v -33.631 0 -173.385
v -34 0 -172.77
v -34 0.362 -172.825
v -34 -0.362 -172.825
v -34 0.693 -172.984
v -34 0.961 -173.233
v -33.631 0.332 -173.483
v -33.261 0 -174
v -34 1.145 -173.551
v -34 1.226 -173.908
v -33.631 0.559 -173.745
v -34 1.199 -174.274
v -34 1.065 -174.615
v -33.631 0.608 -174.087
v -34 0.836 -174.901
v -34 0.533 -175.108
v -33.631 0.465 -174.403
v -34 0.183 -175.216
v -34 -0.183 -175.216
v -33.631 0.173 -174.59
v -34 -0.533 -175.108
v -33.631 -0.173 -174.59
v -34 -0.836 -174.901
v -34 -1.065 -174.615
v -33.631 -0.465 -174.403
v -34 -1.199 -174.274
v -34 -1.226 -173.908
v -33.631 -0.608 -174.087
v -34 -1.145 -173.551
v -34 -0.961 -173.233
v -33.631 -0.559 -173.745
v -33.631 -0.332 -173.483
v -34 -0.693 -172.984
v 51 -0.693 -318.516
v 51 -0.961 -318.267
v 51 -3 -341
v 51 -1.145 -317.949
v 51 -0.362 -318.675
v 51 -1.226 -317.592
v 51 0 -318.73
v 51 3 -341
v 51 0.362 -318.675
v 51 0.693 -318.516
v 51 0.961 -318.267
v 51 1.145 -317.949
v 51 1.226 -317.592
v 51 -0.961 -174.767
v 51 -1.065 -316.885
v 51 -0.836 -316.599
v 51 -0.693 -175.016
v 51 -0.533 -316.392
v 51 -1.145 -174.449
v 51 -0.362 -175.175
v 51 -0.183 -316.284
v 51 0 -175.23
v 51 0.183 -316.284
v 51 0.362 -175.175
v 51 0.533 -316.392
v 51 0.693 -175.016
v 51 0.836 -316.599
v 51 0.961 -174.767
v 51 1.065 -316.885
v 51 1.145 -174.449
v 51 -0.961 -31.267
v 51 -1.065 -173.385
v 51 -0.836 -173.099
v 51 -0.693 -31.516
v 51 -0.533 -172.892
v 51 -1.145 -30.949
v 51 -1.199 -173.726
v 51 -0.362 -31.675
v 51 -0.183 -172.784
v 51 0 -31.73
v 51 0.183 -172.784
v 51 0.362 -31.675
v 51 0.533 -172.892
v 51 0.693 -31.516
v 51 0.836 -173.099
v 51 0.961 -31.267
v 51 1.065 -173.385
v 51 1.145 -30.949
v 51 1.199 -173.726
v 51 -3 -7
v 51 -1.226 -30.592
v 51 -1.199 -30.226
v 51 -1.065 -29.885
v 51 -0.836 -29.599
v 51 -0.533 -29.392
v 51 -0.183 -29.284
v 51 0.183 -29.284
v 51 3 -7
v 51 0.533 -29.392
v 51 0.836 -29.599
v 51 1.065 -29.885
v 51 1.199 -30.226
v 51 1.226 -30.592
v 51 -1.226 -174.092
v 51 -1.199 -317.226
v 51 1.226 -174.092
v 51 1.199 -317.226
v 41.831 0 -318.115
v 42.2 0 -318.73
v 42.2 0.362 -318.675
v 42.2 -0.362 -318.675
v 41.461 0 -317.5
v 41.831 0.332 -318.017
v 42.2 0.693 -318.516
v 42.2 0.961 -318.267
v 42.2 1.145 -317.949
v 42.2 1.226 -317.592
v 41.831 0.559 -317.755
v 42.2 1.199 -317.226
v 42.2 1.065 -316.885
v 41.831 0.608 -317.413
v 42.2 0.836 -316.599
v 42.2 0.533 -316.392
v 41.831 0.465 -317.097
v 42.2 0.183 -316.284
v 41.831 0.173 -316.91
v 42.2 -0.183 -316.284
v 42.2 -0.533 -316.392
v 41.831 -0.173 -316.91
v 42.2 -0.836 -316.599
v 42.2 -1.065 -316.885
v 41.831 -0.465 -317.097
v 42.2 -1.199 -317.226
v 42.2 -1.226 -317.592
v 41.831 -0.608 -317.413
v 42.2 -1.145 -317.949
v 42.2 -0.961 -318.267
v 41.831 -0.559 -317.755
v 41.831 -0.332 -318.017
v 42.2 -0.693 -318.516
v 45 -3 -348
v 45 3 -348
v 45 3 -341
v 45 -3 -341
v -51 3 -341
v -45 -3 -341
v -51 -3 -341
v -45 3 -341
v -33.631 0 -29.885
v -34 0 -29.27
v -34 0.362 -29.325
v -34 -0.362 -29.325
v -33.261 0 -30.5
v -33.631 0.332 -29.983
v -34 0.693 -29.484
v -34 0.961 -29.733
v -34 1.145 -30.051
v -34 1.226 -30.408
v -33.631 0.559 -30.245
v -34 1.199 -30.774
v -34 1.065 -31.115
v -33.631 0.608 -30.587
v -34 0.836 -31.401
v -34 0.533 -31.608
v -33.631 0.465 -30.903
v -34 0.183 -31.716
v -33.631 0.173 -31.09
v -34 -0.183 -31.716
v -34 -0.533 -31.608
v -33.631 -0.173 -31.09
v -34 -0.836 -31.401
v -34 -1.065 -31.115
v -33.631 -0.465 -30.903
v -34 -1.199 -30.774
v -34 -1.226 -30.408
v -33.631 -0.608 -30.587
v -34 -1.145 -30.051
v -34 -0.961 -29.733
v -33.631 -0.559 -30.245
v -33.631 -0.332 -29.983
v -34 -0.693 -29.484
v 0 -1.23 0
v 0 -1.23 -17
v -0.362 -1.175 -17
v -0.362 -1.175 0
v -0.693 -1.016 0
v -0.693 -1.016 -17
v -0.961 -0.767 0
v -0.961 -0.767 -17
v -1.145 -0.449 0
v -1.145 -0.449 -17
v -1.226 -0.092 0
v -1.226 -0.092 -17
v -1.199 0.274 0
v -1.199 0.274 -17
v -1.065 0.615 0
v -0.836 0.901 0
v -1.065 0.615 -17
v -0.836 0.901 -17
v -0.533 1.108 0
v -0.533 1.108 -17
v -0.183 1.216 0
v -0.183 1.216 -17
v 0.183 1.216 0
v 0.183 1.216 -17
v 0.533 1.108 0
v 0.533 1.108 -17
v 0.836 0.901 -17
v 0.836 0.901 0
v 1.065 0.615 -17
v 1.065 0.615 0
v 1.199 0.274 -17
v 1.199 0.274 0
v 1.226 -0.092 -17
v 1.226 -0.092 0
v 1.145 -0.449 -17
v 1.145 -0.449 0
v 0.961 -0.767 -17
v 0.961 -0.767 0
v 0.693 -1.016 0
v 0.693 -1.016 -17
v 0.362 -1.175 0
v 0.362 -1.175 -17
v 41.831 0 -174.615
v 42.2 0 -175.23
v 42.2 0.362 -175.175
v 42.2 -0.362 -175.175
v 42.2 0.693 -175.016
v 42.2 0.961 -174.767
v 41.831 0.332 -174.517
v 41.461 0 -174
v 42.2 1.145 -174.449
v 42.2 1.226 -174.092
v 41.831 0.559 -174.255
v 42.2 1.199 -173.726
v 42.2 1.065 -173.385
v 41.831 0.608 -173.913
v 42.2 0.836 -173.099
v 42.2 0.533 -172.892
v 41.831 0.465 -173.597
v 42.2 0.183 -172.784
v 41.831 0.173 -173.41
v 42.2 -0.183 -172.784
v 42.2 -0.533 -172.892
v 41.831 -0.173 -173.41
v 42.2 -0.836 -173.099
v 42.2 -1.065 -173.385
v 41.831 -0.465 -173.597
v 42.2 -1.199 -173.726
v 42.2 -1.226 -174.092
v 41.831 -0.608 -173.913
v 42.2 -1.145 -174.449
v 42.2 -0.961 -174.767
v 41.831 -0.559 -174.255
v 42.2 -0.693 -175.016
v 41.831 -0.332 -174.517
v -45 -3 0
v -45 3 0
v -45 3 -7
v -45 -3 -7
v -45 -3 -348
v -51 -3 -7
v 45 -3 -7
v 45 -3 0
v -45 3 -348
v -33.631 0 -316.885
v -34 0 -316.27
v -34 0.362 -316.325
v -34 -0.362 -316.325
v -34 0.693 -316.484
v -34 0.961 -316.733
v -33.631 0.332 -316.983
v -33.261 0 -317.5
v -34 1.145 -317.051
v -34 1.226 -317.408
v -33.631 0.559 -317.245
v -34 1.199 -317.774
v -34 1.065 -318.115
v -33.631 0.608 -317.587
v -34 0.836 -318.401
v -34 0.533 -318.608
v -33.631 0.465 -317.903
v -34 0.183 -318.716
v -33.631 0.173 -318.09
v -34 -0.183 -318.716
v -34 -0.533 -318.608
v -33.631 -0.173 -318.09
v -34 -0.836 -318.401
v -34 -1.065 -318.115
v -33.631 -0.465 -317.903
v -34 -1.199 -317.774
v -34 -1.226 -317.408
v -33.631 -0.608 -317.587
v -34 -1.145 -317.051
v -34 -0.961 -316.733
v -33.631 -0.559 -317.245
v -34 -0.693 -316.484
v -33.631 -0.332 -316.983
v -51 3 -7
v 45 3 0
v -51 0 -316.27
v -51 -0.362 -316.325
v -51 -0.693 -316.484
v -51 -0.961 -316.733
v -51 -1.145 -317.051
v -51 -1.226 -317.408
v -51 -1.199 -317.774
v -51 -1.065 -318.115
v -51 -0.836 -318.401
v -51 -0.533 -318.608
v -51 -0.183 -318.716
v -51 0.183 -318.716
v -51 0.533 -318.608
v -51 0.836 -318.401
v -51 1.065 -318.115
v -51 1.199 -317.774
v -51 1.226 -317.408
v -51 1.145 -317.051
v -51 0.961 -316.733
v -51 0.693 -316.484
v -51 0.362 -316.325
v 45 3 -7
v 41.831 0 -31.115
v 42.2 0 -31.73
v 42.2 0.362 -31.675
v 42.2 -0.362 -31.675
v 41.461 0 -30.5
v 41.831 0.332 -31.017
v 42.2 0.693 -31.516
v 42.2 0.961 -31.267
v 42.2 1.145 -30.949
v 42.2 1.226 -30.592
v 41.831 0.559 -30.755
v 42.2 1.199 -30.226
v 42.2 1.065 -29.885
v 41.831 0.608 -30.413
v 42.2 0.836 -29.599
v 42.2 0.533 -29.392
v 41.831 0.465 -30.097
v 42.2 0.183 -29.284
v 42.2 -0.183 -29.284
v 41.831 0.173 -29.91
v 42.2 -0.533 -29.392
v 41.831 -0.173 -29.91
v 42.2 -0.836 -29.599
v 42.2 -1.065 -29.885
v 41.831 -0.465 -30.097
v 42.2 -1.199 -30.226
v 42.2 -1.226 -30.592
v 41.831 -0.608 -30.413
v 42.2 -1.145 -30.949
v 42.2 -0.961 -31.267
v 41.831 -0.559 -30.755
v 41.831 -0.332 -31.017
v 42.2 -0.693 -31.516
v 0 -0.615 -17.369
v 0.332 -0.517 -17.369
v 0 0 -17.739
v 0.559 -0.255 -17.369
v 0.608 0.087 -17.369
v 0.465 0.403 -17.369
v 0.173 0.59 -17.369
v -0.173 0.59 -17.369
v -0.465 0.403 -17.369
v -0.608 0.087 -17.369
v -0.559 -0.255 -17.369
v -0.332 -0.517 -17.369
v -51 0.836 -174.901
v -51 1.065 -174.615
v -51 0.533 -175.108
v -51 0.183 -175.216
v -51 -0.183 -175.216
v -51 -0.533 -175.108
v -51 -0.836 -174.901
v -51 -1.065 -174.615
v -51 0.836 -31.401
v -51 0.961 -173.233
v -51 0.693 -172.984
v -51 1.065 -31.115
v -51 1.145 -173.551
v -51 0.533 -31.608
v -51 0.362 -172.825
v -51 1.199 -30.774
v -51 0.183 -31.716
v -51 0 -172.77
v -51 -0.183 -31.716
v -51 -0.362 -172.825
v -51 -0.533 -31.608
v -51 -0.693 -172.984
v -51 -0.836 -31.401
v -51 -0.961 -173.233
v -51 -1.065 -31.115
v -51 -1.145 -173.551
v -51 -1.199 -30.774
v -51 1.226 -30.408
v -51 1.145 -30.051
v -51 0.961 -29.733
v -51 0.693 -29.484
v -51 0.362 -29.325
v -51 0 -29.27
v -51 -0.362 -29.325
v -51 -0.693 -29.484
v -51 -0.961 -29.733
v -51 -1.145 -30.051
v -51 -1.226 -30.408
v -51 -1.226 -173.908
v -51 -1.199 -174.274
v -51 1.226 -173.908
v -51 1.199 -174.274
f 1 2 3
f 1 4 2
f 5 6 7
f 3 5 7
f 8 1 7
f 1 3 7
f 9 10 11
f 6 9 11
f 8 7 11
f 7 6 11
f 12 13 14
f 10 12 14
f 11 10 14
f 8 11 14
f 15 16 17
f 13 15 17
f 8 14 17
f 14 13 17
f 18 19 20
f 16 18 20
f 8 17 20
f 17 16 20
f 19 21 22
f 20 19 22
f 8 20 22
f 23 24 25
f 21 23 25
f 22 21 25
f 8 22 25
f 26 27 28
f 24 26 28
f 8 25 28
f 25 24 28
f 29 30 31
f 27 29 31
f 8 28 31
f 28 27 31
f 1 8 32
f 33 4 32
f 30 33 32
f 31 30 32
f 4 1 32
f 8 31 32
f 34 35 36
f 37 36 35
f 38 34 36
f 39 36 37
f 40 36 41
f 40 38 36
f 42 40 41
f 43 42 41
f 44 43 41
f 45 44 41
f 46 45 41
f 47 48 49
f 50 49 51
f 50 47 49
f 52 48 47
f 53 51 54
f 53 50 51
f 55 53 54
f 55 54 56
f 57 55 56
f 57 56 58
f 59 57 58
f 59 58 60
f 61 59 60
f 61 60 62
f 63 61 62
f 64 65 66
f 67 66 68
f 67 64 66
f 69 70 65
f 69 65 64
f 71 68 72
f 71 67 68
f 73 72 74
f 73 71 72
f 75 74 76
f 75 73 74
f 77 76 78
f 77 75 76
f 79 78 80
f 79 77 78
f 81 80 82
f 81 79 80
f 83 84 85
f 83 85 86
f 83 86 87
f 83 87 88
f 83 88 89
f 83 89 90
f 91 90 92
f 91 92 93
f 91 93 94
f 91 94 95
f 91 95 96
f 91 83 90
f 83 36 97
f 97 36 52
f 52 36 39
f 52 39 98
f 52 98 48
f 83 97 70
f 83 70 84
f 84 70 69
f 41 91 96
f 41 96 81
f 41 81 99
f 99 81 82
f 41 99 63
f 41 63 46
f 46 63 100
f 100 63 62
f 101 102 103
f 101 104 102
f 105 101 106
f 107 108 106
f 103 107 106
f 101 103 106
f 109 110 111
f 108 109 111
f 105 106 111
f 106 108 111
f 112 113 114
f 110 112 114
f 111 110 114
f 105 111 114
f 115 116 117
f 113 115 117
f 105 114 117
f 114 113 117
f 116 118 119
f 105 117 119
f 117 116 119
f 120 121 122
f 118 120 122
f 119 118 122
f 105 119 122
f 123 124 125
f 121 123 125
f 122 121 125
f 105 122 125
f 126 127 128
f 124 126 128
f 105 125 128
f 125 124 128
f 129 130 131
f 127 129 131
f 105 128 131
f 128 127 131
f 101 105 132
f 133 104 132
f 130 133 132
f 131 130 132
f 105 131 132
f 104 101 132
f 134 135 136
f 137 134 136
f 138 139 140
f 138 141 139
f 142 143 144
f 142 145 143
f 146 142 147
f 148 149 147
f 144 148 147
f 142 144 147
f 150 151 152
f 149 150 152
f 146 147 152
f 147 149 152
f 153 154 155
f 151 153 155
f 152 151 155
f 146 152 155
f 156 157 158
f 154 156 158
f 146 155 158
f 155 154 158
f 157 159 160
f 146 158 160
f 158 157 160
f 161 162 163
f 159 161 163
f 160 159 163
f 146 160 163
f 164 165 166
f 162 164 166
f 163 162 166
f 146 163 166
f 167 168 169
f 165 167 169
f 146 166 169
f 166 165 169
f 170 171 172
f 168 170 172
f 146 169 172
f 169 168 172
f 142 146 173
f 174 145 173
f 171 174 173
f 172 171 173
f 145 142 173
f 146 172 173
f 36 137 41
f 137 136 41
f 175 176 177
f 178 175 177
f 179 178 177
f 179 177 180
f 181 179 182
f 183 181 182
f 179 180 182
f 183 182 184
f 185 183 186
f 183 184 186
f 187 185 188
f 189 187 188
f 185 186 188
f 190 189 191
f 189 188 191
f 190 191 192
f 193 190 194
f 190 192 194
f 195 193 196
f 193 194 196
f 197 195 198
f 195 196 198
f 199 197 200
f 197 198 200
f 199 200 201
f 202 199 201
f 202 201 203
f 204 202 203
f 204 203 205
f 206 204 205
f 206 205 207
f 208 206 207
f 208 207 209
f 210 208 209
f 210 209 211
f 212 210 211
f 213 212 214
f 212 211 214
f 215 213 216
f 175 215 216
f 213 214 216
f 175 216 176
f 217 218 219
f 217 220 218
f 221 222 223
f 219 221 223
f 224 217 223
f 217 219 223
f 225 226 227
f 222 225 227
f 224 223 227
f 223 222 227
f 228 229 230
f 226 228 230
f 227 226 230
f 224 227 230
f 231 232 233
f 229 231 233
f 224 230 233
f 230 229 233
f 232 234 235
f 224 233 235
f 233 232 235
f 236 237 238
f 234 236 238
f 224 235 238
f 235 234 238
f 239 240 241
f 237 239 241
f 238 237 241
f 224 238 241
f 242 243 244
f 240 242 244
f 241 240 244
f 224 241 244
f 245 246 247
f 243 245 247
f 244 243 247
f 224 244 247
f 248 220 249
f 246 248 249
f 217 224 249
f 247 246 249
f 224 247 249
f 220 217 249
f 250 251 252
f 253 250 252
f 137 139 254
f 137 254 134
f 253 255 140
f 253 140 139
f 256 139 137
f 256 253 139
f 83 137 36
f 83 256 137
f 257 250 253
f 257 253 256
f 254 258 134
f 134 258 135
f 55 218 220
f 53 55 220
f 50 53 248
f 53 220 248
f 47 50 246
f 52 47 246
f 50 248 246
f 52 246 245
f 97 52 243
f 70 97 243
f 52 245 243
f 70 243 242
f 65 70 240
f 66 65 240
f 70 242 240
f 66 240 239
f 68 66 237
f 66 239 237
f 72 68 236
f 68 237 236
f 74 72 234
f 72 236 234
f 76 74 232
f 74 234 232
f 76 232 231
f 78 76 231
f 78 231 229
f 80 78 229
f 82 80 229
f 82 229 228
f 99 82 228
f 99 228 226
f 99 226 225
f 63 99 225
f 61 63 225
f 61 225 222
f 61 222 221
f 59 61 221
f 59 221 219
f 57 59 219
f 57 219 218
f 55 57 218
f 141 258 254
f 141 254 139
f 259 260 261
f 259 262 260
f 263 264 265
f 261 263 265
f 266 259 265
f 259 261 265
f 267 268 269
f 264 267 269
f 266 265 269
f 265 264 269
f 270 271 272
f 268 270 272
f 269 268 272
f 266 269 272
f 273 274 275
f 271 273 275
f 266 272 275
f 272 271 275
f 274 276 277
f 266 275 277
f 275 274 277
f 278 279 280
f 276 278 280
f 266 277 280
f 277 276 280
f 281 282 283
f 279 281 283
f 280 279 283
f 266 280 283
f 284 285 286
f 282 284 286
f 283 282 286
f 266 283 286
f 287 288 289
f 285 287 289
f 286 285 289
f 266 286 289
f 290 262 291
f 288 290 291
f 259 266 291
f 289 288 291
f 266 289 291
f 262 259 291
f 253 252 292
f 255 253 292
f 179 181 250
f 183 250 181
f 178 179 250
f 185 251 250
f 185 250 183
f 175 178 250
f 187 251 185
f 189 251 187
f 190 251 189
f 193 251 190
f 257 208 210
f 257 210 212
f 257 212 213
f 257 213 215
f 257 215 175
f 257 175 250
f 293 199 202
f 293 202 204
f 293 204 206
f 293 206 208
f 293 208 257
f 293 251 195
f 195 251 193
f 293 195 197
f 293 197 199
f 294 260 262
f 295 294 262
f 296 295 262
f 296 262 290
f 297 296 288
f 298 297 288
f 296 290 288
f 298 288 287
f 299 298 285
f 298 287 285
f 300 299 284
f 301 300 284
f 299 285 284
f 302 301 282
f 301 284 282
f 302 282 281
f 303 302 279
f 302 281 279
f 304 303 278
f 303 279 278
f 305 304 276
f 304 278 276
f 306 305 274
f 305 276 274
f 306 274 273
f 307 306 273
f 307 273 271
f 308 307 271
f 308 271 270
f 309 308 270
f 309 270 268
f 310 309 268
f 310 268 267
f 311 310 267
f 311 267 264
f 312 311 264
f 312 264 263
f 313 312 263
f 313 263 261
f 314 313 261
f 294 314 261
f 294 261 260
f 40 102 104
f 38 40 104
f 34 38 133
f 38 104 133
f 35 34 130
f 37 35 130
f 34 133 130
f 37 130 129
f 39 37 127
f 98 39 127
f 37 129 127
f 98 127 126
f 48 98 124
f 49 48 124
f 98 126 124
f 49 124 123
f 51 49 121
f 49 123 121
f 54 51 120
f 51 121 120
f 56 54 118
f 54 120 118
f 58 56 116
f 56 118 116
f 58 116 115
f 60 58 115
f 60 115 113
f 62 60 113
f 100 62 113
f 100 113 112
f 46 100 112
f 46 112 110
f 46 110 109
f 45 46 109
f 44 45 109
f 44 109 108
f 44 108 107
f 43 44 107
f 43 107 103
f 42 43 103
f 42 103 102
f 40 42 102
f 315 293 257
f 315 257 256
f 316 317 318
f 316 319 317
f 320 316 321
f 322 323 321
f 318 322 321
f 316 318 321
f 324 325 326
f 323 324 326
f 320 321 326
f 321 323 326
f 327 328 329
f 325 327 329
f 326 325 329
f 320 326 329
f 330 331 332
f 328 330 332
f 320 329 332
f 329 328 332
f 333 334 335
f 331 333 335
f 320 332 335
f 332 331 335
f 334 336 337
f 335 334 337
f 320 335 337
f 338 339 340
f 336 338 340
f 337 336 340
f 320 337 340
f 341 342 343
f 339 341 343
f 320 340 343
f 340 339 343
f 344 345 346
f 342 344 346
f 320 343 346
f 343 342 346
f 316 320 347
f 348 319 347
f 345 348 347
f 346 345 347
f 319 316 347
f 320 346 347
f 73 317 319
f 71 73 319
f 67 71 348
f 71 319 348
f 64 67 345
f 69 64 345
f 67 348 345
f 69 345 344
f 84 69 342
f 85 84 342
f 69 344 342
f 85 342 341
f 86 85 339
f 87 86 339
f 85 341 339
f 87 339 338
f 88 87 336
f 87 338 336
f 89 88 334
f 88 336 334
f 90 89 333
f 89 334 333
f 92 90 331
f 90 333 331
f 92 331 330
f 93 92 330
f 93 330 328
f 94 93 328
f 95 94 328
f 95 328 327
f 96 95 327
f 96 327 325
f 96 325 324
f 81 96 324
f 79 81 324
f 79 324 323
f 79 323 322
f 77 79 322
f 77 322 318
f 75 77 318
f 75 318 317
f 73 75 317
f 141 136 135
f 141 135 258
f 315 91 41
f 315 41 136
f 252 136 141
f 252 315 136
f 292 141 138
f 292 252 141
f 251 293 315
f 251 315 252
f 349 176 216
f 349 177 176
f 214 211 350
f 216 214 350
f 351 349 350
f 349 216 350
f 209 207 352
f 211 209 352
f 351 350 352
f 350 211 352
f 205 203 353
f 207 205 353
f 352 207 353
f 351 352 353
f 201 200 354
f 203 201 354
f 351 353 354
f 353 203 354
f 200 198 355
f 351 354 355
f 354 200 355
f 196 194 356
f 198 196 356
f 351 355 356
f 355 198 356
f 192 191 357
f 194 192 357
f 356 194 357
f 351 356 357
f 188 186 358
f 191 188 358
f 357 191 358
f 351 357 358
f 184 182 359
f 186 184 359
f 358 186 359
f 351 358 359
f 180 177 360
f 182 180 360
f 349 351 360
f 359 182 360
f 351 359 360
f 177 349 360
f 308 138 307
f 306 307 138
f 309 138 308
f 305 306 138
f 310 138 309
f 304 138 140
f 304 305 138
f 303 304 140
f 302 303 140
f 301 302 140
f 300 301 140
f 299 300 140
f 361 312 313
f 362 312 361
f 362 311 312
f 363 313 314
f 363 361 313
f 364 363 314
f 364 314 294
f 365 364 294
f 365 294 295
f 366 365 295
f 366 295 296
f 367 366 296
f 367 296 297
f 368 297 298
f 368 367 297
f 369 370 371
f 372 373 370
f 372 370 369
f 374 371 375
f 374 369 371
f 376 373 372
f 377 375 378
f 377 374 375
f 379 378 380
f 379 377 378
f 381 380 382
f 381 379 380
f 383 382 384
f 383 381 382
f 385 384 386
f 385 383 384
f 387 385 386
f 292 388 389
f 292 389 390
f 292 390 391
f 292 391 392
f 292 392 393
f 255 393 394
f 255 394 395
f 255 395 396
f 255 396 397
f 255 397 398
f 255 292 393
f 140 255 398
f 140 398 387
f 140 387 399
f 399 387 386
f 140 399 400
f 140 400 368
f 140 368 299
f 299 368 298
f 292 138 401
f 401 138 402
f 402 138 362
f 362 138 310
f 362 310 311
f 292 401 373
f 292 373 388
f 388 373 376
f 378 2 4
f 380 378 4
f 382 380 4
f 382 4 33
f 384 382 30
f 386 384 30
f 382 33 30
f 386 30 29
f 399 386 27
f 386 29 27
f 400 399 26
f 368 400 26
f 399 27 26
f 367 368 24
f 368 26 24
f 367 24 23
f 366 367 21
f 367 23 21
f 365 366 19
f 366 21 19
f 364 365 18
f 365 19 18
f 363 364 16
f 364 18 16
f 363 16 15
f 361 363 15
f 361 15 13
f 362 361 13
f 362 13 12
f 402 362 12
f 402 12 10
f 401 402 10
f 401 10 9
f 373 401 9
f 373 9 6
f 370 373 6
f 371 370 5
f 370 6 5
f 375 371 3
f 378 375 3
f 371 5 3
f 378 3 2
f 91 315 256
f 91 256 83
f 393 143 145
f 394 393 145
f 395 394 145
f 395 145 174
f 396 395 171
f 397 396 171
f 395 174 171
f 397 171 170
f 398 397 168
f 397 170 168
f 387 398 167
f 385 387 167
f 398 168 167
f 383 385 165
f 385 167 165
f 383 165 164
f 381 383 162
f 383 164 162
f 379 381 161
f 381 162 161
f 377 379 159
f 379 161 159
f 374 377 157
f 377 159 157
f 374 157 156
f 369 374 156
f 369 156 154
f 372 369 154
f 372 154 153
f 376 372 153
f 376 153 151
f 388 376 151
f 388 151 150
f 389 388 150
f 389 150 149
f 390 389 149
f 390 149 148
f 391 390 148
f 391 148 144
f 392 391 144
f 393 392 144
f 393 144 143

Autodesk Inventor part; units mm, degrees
ref_plane "YZ Plane" through (0, 0, 0) normal (1, 0, 0) x (0, 1, 0)
ref_plane "XZ Plane" through (0, 0, 0) normal (0, 1, 0) x (-1, 0, 0)
ref_plane "XY Plane" through (0, 0, 0) normal (0, 0, 1) x (1, 0, 0)
sketch "Skizze1" plane through (0, 0, 0) normal (0, 0, 1) x (1, 0, 0)
  line L0 (-71.4, 0) -> (71.4, 0) projected
  line L1 (0, -4.2) -> (0, 4.2) projected
  line L2 (-51, -3) -> (51, -3)
  line L3 (51, -3) -> (51, 3)
  line L4 (51, 3) -> (-51, 3)
  line L5 (-51, 3) -> (-51, -3)
  line L6 (-51, -3) -> (51, 3) construction
  line L7 (51, -3) -> (-51, 3) construction
  point P0 (0, 0)
  dimension "d0" = 102
  dimension "d1" = 6
extrude "Extrusion1" add sketch "Skizze1" against normal blind 348
sketch "Skizze2" plane through (-51, 3, 0) normal (0, 1, 0) x (1, 0, 0)
  line L0 (102, 0) -> (0, 0) projected
  line L1 (102, 0) -> (102, 348) projected
  line L2 (0, 348) -> (102, 348) projected
  line L3 (0, 0) -> (0, 348) projected
  line L4 (-20.4, 0) -> (122.4, 0) projected
  line L5 (51, 417.6) -> (51, -69.6) projected
  line L6 (0, 0) -> (102, 0) projected
  line L7 (0, 0) -> (6, 0)
  line L8 (6, 0) -> (6, 7)
  line L9 (6, 7) -> (0, 7)
  line L10 (0, 7) -> (0, 0)
  line L11 (102, 0) -> (96, 0)
  line L12 (96, 0) -> (96, 7)
  line L13 (96, 7) -> (102, 7)
  line L14 (102, 7) -> (102, 0)
  line L15 (102, 0) -> (102, 348) projected
  line L16 (102, 348) -> (96, 348)
  line L17 (96, 348) -> (96, 341)
  line L18 (96, 341) -> (102, 341)
  line L19 (102, 341) -> (102, 348)
  line L20 (102, 348) -> (0, 348) projected
  line L21 (0, 348) -> (6, 348)
  line L22 (6, 348) -> (6, 341)
  line L23 (6, 341) -> (0, 341)
  line L24 (0, 341) -> (0, 348)
  point P0 (51, 0)
  point P1 (0, 7)
  point P2 (6, 0)
  dimension "d4" = 6
  dimension "d5" = 7
  dimension "d6" = 6
  dimension "d7" = 7
  dimension "d8" = 6
extrude "Extrusion2" cut sketch "Skizze2" against normal blind 348 contours L0 L12 L13 L1 | L18 L17 L2 L1 | L0 L3 L9 L8 | L22 L23 L3 L2
sketch "Skizze3" plane through (51, 3, -7) normal (1, 0, 0) x (0, 0, -1)
  line L0 (334, -6) -> (334, 0) projected
  line L1 (0, 0) -> (334, 0) projected
  line L2 (0, 0) -> (0, -6) projected
  line L3 (0, -6) -> (334, -6) projected
  point P0 (-7, -3)
  point P1 (23.5, -3)
  point P2 (167, -3)
  point P3 (310.5, -3)
  dimension "d11" = 23.5
  dimension "d12" = 23.5
  dimension "d13" = 167
hole "Bohrung1" at (51, 0, -30.5) at (51, 0, -174) at (51, 0, -317.5) direction (-1, 0, 0) diameter 2.459 depth 8.8 tip angle 118 thread size "M3x0.5" class "6H" standard "ANSI Metric M Profile"
sketch "Skizze4" plane through (0, 0, 0) normal (0, 0, 1) x (1, 0, 0)
  line L0 (-45, 3) -> (-45, -3) projected
  line L1 (-45, -3) -> (45, -3) projected
  line L2 (45, -3) -> (45, 3) projected
  line L3 (45, 3) -> (-45, 3) projected
  line L4 (-71.4, 0) -> (71.4, 0) projected
  line L5 (0, -4.2) -> (0, 4.2) projected
  point P0 (0, 0)
  point P1 (0, 0)
hole "Bohrung2" at (0, 0, 0) direction (0, 0, -1) diameter 2.459 depth 17 tip angle 118 thread size "M3x0.5" class "6H" standard "ANSI Metric M Profile"
sketch "Skizze5" plane through (-51, 3, -341) normal (-1, 0, 0) x (0, 0, 1)
  line L0 (334, -6) -> (334, 0) projected
  line L1 (334, 0) -> (0, 0) projected
  line L2 (0, 0) -> (0, -6) projected
  line L3 (334, -6) -> (0, -6) projected
  circle A0 centre (310.5, -3) radius 1.2295 projected
  circle A1 centre (167, -3) radius 1.2295 projected
  circle A2 centre (23.5, -3) radius 1.2295 projected
  line L4 (341, -7.2) -> (341, 1.2) projected
  line L5 (-76.6, -3) -> (410.6, -3) projected
  circle A3 centre (23.5, -3) radius 1.2295 projected
  point P0 (341, -3)
hole "Bohrung3" at (-51, 0, -317.5) at (-51, 0, -174) at (-51, 0, -30.5) direction (1, 0, 0) diameter 2.459 depth 17 tip angle 118 thread size "M3x0.5" class "6H" standard "ANSI Metric M Profile"
properties part number "I Bodenplatte" material "PVC, hart"
